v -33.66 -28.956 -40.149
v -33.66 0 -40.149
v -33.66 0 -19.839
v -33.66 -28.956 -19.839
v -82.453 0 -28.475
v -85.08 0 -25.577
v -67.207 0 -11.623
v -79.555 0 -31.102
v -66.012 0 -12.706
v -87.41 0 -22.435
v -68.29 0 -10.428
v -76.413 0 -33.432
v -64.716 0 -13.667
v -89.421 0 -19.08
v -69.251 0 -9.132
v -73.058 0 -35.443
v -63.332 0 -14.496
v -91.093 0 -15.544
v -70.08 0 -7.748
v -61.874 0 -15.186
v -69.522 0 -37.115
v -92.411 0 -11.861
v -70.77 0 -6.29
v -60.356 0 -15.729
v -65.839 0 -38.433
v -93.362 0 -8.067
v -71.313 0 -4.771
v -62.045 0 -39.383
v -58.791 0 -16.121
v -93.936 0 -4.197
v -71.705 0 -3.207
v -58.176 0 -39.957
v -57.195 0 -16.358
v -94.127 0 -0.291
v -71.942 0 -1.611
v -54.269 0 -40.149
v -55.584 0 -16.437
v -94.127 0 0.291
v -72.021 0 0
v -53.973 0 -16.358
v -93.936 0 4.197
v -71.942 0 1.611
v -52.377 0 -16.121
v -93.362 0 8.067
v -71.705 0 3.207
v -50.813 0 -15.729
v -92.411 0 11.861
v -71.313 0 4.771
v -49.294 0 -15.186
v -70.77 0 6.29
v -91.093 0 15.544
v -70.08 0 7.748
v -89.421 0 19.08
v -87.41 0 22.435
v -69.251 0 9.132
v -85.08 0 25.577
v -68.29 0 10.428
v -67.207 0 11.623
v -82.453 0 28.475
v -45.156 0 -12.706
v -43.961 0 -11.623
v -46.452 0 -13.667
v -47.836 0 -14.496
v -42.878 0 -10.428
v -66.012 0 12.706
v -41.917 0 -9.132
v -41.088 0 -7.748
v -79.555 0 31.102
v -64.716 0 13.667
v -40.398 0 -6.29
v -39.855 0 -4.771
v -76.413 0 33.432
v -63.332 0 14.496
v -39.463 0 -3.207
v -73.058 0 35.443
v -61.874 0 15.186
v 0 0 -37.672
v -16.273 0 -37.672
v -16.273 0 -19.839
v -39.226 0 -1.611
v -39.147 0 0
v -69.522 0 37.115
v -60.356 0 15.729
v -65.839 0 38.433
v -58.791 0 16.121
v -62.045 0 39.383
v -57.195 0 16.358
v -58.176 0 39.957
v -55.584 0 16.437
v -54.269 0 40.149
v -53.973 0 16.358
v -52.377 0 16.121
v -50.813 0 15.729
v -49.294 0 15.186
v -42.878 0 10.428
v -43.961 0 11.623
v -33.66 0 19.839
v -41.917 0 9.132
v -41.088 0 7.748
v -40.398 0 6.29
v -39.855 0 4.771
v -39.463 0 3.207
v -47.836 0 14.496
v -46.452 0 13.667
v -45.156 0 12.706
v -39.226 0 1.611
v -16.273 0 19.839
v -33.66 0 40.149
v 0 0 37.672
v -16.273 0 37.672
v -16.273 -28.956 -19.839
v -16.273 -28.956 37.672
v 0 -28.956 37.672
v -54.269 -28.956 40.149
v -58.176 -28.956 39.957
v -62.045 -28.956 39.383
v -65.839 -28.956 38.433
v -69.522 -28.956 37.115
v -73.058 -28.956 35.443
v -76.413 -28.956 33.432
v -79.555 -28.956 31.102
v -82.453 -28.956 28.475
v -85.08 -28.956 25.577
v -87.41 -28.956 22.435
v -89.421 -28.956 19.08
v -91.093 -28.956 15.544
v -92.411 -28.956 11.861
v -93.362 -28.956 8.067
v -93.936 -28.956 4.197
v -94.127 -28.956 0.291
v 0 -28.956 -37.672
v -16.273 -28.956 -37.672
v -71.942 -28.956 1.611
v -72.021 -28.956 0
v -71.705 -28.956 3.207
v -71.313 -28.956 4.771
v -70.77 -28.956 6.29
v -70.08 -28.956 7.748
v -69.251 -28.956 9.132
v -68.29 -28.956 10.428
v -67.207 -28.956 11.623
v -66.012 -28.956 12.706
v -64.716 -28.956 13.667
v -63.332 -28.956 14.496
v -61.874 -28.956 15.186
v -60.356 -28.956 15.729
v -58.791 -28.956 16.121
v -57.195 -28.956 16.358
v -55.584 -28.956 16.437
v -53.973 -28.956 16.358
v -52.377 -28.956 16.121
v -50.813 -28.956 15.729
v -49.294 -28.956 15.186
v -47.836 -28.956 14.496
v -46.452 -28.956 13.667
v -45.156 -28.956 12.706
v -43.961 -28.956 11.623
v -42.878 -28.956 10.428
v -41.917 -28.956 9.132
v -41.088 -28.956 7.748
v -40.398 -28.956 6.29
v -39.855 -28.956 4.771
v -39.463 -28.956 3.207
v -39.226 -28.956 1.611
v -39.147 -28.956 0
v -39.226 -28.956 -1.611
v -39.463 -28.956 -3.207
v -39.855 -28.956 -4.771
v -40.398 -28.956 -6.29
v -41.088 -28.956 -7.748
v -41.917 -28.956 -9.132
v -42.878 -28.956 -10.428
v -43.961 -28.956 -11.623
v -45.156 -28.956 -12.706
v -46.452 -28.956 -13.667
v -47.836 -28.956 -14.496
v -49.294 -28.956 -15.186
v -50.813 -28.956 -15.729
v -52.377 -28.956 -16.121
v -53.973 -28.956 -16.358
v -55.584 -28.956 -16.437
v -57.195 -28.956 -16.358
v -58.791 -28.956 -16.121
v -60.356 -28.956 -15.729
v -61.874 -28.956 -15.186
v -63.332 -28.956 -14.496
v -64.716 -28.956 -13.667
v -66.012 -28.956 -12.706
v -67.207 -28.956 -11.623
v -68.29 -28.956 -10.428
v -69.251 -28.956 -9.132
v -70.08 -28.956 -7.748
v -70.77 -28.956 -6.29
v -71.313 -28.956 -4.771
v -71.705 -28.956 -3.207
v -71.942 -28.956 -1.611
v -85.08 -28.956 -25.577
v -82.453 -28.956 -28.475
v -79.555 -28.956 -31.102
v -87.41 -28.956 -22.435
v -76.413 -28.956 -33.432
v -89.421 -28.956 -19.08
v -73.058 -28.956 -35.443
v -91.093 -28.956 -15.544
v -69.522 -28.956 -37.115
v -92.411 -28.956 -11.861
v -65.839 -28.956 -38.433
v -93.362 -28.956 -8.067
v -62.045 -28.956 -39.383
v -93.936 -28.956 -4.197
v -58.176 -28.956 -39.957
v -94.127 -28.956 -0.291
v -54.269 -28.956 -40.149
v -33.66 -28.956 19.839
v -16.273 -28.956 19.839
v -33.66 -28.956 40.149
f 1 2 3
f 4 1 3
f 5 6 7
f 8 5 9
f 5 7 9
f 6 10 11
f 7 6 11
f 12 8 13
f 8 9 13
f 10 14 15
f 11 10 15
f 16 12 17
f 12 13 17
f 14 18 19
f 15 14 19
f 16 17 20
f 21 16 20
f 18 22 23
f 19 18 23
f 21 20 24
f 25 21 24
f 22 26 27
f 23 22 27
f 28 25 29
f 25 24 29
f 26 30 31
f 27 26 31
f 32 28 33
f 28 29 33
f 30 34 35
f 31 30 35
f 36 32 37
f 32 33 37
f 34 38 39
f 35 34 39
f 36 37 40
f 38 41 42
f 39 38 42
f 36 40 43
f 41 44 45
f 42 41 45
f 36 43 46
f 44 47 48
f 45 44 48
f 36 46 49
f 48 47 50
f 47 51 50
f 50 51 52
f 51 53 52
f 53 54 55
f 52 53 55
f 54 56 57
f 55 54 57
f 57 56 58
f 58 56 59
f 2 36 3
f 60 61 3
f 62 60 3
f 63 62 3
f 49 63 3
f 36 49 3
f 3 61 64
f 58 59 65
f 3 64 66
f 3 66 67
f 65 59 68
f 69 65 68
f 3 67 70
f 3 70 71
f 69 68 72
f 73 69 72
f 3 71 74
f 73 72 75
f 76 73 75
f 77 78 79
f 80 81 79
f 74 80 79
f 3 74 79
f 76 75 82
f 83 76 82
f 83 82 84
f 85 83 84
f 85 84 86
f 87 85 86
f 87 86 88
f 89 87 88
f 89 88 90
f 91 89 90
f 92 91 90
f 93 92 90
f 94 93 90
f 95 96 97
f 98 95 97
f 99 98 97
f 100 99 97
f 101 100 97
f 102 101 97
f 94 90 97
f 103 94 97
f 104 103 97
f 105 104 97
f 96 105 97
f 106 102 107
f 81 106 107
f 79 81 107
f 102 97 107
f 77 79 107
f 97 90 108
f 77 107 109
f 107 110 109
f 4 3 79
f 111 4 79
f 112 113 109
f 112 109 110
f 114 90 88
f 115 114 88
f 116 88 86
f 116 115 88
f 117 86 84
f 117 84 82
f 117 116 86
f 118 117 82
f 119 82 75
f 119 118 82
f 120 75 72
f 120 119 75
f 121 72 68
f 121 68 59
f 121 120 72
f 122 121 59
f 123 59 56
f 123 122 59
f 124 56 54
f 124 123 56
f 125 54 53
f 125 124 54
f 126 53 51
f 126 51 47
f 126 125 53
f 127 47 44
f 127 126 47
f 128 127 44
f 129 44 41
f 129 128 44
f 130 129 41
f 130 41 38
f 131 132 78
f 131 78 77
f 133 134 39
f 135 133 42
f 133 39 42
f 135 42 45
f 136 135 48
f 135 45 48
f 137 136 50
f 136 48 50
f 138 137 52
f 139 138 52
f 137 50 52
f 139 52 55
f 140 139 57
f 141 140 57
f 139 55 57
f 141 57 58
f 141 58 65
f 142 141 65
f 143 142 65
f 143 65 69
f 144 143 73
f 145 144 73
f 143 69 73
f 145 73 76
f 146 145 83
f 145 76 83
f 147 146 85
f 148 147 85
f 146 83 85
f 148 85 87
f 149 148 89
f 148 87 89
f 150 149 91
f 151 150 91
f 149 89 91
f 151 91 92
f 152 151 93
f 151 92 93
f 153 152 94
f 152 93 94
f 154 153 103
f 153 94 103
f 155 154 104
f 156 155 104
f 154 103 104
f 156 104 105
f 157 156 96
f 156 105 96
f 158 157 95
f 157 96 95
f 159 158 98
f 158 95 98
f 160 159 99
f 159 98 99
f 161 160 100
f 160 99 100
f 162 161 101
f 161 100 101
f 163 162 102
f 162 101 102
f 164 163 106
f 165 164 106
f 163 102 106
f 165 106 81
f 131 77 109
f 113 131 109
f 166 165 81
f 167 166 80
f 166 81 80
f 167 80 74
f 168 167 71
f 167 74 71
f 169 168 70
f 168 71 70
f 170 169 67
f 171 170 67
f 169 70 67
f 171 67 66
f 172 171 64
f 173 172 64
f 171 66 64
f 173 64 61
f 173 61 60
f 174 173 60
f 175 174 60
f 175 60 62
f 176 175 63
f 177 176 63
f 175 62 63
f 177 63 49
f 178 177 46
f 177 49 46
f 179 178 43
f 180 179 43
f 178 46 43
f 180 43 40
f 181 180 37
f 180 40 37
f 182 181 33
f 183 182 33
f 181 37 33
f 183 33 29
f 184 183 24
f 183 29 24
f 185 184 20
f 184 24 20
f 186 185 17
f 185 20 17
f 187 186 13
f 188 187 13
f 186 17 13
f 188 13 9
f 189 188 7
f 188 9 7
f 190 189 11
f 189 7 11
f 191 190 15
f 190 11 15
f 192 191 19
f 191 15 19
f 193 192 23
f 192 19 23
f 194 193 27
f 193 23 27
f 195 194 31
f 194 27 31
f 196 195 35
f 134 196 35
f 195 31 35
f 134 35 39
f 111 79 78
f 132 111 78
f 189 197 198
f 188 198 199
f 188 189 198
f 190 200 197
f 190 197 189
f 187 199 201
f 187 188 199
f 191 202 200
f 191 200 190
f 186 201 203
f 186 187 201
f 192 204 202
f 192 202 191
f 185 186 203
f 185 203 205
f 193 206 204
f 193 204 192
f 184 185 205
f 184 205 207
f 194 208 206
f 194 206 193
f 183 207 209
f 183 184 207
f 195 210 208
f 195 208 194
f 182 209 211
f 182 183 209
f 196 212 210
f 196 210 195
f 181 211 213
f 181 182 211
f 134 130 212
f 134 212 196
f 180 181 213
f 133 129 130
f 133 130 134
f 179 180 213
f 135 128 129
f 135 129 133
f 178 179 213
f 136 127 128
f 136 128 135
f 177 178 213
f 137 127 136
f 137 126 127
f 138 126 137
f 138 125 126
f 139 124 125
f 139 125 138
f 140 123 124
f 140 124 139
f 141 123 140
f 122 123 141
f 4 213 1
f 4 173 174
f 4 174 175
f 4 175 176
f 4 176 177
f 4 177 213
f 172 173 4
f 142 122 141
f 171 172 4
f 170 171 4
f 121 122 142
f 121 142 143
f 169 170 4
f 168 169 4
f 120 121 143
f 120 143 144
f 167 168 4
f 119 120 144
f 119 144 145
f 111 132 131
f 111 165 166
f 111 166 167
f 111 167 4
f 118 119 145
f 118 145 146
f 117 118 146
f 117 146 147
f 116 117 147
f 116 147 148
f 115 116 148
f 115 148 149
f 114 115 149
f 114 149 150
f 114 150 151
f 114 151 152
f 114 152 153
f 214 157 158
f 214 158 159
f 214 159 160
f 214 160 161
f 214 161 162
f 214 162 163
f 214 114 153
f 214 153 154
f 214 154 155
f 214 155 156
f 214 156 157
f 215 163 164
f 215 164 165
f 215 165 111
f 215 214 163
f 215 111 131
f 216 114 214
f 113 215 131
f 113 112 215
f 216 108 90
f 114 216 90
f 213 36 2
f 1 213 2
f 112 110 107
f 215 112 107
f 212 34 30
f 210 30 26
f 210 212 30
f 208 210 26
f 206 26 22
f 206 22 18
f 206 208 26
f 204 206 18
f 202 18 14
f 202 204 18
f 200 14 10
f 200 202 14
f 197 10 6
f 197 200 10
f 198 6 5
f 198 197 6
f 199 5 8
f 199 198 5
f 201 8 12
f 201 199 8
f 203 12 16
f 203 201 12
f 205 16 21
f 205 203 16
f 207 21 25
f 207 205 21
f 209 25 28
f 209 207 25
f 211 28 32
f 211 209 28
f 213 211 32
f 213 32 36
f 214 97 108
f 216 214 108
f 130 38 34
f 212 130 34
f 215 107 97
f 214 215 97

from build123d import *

# Parameters (mm, degrees)
F1_DEPTH = 28.956
F2_R     = 39.858666


with BuildPart() as f1:
    # F0 (on Front) → F1 (new body)
    with BuildSketch(Plane.XZ):
        with BuildLine():
            Line((0, -37.671965), (0, 0))
            Line((0, 0), (-39.146767, 0))
            ThreePointArc((-39.146767, 0), (-55.584025, -16.437258), (-72.021282, 0))
            Line((-72.021282, 0), (-94.127469, 0))
            Line((-94.127469, 0), (-94.127469, -40.149245))
            Line((-94.127469, -40.149245), (-65.204445, -40.149245))
            Line((-65.204445, -40.149245), (-55.504855, -40.149245))
            Line((-55.504855, -40.149245), (-33.65957, -40.149245))
            Line((-33.65957, -40.149245), (-33.65957, -19.839078))
            Line((-33.65957, -19.839078), (-16.272509, -19.839078))
            Line((-16.272509, -19.839078), (-16.272509, -36.780316))
            Line((-16.272509, -36.780316), (-16.272509, -37.671965))
            Line((-16.272509, -37.671965), (0, -37.671965))
        make_face()
        with BuildLine():
            Line((0, 0), (0, 37.671965))
            Line((0, 37.671965), (-16.272509, 37.671965))
            Line((-16.272509, 37.671965), (-16.272509, 36.780316))
            Line((-16.272509, 36.780316), (-16.272509, 19.839078))
            Line((-16.272509, 19.839078), (-33.65957, 19.839078))
            Line((-33.65957, 19.839078), (-33.65957, 40.149245))
            Line((-33.65957, 40.149245), (-55.504855, 40.149245))
            Line((-55.504855, 40.149245), (-65.204445, 40.149245))
            Line((-65.204445, 40.149245), (-94.127469, 40.149245))
            Line((-94.127469, 40.149245), (-94.127469, 0))
            Line((-94.127469, 0), (-72.021282, 0))
            ThreePointArc((-72.021282, 0), (-55.584025, 16.437258), (-39.146767, 0))
            Line((-39.146767, 0), (0, 0))
        make_face()
    extrude(amount=F1_DEPTH)

    # F2
    f2_edges = [f1.edges().sort_by_distance(p)[0] for p in [
        (-94.127469, -14.478, 40.149245),
        (-94.127469, -14.478, -40.149245),
    ]]
    fillet(f2_edges, radius=F2_R)


solid = f1.part
